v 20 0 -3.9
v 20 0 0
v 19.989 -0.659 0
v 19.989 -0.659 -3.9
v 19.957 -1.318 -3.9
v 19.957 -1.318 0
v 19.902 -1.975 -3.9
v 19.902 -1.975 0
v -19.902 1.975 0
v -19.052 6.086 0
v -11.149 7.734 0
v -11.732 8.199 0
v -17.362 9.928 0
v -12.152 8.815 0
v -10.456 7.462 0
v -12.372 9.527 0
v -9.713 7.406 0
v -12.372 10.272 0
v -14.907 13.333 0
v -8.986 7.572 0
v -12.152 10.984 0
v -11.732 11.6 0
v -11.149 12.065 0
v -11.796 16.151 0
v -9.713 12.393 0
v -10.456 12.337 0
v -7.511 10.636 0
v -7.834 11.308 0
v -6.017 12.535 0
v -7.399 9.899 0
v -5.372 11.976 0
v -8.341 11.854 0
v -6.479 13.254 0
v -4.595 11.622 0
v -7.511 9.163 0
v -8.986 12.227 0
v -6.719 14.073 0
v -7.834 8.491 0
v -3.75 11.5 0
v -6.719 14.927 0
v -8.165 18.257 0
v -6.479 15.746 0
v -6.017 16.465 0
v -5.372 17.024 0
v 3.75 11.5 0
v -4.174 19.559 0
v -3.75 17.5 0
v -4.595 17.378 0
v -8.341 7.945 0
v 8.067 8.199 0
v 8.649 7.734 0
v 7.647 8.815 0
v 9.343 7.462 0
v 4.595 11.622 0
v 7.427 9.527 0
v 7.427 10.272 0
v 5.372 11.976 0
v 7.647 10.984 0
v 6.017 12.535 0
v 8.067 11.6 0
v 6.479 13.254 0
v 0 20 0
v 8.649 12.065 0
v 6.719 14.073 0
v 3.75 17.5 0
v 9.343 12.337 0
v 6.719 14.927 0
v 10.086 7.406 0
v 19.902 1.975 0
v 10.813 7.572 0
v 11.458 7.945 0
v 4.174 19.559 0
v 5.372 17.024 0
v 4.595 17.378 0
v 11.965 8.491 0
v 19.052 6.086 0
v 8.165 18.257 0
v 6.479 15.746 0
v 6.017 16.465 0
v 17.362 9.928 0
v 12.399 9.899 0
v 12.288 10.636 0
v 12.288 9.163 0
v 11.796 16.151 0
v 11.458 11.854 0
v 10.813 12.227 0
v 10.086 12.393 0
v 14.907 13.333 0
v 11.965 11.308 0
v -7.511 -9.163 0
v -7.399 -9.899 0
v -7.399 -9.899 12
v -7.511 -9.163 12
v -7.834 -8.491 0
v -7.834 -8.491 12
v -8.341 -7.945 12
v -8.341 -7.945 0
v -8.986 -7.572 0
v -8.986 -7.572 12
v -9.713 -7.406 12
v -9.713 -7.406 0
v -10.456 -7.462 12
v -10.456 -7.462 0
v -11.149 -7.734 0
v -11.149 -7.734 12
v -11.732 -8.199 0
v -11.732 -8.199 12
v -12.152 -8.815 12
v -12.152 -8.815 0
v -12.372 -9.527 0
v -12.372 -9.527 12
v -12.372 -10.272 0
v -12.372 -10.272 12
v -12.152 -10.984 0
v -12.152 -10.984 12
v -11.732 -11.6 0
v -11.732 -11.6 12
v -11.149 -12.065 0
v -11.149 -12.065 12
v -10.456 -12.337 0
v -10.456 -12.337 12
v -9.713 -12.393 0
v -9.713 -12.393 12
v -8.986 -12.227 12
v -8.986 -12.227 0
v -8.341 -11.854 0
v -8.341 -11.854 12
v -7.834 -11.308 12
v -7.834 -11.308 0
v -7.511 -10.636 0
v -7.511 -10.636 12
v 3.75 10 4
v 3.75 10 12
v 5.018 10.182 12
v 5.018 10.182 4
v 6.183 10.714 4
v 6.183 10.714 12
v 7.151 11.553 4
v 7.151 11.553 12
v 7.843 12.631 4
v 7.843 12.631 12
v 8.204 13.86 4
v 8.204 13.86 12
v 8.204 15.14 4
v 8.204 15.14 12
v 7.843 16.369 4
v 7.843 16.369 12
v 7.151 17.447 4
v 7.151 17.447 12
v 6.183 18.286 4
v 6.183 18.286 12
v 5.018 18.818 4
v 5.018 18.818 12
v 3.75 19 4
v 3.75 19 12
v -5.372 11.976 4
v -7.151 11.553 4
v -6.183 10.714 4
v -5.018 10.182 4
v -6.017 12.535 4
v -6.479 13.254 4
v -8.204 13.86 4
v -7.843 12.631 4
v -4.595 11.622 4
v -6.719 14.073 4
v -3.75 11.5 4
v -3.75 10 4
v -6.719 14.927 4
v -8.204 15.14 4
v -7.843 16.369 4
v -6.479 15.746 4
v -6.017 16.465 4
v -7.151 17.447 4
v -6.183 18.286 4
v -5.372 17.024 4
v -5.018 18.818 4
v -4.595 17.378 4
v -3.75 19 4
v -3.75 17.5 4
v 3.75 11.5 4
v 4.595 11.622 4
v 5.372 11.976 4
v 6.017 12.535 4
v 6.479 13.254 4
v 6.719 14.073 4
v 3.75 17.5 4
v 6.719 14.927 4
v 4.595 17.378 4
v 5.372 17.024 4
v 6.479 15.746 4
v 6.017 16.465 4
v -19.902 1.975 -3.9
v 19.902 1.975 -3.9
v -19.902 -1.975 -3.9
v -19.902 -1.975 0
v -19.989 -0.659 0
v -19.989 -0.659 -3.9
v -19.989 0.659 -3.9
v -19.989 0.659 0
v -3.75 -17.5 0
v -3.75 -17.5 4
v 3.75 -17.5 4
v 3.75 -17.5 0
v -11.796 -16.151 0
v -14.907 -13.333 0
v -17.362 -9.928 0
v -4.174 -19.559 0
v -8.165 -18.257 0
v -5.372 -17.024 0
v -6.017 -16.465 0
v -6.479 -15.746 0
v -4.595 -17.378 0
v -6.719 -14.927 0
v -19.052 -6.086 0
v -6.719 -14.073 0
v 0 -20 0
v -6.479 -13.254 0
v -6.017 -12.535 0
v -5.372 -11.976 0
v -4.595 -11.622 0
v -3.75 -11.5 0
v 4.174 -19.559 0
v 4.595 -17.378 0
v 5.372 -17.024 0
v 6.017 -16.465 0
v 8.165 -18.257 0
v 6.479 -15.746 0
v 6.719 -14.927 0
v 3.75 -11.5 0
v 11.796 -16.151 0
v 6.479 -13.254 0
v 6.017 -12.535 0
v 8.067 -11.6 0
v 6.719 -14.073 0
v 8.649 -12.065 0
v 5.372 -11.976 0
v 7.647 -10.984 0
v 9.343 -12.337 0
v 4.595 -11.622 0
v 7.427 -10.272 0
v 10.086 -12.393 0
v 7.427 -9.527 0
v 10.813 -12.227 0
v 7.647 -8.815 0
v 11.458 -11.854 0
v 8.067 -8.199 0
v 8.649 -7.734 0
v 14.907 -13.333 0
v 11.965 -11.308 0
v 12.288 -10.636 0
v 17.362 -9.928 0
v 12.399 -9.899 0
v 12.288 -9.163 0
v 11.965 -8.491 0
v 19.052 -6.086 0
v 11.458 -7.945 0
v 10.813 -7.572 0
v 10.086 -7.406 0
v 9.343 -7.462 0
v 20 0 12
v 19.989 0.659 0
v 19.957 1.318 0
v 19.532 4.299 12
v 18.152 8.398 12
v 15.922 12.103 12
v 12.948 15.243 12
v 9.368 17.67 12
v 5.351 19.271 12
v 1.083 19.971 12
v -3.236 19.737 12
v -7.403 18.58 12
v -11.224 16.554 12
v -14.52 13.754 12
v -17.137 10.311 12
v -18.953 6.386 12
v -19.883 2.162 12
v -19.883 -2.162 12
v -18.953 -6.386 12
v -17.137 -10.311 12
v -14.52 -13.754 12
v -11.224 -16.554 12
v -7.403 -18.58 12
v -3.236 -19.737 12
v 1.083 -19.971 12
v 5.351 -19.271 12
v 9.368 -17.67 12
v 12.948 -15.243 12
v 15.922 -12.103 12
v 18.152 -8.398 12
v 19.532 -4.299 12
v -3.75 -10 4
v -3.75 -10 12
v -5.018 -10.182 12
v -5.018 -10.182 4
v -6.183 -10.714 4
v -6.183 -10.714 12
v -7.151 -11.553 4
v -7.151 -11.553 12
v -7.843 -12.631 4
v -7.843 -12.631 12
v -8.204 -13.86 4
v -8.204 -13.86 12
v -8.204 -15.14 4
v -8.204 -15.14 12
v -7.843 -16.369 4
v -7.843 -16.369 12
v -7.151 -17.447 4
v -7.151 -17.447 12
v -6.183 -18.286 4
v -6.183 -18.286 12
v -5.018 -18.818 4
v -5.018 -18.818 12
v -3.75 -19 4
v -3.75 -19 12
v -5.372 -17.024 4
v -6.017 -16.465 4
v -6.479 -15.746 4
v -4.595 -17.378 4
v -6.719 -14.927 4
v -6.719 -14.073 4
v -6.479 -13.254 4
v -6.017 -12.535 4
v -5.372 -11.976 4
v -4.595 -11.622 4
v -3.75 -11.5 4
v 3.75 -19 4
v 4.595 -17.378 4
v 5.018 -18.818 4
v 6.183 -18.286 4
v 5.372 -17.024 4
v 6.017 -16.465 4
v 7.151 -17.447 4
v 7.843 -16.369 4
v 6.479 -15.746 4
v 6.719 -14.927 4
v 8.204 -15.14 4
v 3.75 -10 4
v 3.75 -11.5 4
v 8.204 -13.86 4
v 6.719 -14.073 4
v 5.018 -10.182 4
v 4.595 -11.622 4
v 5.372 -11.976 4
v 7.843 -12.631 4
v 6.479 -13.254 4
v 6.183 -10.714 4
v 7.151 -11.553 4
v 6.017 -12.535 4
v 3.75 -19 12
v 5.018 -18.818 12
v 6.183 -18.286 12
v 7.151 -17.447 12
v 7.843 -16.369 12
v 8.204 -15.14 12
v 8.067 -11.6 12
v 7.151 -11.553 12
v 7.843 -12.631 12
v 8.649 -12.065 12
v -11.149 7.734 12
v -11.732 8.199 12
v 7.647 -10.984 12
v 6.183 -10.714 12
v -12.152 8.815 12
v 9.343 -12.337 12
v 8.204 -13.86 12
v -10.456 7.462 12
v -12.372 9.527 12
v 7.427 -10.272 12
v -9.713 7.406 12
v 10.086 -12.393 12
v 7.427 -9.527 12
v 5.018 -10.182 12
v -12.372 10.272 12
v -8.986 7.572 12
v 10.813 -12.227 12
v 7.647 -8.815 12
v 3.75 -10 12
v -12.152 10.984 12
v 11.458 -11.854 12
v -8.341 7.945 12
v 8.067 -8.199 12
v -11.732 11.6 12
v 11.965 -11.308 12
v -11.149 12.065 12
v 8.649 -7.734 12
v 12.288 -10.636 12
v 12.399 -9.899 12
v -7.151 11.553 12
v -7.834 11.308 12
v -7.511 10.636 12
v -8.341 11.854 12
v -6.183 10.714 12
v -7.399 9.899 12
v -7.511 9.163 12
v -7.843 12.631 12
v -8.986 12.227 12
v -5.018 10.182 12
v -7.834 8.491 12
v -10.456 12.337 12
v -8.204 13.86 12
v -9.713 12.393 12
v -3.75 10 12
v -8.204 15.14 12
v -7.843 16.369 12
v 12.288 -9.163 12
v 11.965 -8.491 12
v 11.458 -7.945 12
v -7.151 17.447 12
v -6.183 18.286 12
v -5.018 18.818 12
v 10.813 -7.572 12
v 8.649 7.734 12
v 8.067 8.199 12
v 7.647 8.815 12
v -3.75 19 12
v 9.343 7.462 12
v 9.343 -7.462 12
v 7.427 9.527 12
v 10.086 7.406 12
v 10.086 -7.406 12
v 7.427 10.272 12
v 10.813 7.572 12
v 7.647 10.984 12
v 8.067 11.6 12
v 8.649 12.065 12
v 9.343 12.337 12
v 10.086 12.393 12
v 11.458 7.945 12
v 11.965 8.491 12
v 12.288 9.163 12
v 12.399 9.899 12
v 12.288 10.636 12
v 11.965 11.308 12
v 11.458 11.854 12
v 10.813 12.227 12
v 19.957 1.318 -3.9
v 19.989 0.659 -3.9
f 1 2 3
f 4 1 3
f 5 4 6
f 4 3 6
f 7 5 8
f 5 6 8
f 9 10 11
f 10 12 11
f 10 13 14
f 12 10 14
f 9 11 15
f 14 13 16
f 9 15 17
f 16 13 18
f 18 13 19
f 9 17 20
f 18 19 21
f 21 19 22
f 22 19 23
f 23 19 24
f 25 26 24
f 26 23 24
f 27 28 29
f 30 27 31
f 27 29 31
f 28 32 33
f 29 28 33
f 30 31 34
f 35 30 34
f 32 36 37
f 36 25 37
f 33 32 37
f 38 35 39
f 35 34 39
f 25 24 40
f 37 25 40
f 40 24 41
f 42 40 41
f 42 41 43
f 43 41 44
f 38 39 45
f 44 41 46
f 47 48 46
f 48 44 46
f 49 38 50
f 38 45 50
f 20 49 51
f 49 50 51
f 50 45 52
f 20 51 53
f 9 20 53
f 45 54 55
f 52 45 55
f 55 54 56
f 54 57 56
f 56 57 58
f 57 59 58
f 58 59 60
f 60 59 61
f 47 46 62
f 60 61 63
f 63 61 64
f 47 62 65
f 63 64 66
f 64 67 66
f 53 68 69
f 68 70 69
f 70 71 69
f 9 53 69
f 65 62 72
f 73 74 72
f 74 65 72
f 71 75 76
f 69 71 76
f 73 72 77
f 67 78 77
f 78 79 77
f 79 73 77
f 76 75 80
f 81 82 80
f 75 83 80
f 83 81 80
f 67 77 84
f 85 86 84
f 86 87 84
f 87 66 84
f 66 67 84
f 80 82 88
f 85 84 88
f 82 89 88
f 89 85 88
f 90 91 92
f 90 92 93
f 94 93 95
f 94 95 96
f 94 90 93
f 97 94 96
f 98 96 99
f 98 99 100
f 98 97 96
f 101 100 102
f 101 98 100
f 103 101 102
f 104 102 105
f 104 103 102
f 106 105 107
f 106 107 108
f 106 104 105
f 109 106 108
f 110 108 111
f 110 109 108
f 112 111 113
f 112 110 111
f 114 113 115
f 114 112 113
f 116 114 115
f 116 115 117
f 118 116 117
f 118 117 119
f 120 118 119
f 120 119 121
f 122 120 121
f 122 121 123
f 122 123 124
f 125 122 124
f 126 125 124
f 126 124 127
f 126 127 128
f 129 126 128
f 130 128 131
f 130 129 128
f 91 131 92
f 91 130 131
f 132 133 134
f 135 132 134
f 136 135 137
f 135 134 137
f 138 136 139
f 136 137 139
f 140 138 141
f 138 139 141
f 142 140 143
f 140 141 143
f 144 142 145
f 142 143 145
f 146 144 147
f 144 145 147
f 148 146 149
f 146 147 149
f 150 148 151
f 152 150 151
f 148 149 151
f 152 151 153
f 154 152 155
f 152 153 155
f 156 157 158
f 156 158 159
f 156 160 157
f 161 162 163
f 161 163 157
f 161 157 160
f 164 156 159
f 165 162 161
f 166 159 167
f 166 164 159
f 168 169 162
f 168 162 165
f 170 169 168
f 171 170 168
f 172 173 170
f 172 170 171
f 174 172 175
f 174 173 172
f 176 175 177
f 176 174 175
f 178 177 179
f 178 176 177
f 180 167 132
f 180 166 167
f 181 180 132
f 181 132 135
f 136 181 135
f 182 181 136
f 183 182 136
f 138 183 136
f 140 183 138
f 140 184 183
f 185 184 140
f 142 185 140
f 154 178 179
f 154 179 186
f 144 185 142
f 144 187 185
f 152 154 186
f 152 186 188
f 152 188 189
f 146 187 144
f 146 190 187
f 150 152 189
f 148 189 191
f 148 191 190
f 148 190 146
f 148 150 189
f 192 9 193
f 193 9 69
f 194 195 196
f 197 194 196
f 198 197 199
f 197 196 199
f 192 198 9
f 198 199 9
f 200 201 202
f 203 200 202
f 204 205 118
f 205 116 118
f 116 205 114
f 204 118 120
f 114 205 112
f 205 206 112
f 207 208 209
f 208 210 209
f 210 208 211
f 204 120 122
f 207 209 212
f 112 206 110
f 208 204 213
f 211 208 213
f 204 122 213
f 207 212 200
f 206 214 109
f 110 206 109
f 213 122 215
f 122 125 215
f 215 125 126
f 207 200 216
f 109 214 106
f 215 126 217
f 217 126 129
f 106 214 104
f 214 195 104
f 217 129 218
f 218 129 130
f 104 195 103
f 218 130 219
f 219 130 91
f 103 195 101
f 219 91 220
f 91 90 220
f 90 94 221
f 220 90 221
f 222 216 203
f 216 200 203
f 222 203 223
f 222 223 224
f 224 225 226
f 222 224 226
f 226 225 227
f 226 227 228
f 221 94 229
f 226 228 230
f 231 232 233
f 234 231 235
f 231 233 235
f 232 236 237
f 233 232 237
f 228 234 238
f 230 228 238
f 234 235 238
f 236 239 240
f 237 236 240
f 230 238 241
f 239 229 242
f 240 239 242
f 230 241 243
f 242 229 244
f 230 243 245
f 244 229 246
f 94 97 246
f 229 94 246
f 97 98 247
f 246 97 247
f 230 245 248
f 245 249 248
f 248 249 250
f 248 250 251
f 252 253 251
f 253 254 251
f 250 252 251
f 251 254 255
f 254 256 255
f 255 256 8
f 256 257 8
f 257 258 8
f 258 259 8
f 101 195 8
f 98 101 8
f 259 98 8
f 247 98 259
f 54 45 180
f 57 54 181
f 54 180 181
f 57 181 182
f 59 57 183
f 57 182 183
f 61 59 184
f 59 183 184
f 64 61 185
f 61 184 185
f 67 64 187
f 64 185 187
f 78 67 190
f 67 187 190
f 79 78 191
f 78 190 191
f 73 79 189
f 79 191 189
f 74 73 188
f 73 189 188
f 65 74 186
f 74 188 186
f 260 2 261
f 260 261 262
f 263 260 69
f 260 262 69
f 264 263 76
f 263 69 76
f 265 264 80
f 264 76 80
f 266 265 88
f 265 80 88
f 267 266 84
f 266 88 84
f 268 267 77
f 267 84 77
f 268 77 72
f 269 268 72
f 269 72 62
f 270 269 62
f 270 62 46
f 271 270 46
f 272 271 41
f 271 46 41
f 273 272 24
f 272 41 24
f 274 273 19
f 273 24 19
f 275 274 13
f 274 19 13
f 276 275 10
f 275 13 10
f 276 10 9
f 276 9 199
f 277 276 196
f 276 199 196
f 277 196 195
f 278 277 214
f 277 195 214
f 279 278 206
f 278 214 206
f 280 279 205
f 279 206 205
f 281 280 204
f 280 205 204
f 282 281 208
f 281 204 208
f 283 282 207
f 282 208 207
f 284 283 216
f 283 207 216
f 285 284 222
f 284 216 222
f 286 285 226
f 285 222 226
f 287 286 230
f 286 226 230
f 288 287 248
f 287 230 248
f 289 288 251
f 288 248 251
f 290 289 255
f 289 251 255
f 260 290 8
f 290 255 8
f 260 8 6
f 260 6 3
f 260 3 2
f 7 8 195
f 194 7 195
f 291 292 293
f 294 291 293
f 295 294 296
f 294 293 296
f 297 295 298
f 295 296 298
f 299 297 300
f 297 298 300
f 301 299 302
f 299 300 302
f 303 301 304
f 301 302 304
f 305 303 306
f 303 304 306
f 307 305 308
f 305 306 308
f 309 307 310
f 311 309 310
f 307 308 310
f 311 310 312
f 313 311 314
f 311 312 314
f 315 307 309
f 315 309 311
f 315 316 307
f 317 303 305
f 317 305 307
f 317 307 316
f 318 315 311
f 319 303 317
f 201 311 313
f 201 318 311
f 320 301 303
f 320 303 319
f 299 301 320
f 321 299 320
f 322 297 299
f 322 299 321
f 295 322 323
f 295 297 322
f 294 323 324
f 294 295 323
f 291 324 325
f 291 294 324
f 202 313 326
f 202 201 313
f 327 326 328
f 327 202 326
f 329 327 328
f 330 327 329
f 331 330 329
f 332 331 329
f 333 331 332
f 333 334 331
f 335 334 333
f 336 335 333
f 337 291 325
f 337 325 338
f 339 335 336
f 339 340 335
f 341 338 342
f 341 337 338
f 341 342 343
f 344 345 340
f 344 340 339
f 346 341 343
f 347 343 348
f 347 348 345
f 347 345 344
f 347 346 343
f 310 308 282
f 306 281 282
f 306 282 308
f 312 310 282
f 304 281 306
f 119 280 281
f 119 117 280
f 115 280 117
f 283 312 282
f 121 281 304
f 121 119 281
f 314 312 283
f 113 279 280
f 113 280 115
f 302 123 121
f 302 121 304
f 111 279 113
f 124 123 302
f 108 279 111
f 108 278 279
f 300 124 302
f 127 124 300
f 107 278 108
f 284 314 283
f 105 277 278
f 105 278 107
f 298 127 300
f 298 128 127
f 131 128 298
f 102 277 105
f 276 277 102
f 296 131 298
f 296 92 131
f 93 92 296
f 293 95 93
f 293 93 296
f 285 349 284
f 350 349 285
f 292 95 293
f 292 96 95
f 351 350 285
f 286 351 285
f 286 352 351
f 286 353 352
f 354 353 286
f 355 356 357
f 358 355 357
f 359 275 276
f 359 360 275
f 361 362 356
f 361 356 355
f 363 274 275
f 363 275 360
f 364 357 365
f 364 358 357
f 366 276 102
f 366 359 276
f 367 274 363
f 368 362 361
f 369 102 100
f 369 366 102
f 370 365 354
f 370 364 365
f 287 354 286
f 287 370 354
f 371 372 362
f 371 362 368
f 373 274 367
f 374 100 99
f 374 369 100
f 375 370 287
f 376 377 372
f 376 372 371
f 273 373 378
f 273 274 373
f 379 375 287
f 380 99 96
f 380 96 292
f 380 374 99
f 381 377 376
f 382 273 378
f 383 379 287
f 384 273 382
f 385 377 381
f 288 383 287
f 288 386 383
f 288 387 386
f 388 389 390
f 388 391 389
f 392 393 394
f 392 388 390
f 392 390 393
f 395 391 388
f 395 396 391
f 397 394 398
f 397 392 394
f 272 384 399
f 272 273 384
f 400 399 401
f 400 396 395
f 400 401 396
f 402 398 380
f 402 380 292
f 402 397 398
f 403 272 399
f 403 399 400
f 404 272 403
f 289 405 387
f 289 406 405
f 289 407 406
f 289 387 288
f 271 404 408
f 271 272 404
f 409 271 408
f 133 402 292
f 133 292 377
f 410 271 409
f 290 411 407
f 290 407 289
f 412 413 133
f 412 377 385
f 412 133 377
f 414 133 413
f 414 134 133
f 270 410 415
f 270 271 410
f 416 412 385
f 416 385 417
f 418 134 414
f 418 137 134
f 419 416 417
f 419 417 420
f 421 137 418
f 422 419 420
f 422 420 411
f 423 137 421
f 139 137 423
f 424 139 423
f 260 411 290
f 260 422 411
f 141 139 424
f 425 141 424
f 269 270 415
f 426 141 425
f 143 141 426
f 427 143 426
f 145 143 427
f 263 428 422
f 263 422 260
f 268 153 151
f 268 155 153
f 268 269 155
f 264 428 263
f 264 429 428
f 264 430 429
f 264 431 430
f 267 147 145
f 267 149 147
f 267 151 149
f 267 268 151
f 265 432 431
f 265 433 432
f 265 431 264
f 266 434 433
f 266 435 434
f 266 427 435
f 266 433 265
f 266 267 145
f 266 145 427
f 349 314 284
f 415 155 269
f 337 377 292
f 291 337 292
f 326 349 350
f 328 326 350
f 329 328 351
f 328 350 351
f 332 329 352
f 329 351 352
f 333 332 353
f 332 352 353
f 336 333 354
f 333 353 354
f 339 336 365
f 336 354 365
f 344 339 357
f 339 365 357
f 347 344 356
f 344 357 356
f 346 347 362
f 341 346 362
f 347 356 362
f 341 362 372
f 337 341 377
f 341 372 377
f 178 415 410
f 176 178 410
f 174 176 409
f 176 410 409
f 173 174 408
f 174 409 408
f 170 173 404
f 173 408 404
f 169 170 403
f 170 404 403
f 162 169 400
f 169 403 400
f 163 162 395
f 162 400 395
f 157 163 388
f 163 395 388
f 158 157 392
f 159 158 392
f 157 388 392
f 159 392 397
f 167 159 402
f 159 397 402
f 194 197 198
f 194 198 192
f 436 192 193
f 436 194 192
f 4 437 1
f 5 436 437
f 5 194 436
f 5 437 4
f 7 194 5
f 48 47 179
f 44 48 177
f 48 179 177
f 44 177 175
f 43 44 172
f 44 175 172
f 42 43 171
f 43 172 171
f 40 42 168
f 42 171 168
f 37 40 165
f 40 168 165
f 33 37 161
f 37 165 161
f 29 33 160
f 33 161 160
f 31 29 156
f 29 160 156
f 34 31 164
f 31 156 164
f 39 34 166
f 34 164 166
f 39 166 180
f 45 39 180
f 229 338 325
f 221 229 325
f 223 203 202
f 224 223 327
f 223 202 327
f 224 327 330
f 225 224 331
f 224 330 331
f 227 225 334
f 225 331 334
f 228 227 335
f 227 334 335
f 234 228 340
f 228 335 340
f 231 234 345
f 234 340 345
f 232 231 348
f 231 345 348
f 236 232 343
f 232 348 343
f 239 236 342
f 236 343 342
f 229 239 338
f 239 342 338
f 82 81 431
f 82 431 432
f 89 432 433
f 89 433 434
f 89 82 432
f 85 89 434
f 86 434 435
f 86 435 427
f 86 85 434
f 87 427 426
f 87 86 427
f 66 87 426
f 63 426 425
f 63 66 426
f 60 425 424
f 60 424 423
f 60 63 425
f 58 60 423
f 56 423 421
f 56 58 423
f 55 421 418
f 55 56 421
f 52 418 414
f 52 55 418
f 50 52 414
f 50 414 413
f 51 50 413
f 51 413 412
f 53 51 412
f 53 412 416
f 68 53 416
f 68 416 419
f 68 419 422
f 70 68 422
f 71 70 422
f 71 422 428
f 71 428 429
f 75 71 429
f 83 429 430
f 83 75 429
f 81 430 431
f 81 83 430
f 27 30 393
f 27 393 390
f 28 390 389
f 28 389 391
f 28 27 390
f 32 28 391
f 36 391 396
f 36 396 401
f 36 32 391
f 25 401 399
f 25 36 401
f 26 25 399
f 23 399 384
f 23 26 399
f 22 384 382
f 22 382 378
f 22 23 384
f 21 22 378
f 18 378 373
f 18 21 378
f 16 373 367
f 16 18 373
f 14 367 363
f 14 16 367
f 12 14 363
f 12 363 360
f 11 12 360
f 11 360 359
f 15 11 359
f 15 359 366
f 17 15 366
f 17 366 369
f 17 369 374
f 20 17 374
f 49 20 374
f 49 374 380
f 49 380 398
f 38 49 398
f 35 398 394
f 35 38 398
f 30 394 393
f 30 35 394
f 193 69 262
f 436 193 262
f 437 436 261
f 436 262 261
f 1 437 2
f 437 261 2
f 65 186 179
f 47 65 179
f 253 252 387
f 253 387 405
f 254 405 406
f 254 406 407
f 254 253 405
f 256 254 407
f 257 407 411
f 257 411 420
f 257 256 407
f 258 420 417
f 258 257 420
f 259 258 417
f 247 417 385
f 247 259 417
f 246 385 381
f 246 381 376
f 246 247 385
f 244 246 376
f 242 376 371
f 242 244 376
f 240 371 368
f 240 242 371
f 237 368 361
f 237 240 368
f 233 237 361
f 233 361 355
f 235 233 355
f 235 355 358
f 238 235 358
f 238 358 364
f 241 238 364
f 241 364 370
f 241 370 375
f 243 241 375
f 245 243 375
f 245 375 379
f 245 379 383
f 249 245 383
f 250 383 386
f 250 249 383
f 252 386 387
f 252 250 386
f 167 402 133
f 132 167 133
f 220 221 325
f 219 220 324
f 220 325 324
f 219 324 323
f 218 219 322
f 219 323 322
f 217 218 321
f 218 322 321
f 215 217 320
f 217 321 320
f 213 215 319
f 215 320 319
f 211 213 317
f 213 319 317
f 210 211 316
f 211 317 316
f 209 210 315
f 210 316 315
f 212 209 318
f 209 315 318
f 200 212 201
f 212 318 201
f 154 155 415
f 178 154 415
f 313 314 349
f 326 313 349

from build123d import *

# Parameters (mm, degrees)
F0_R     = 20
F0_R_2   = 2.5
F1_DEPTH = 12
F3_DEPTH = 3.9
F5_DEPTH = 15.901
F7_DEPTH = 8


# Not quite as in the source:
# - after a boolean that leaves OpenCascade's solid faulty, fix() repairs it


with BuildPart() as f1:
    # F0 (on Top) → F1 (new body)
    with BuildSketch(Plane.XY):
        Circle(F0_R)
        with Locations((-9.8994949366, -9.8994949366)):
            Circle(F0_R_2, mode=Mode.SUBTRACT)
        with Locations((9.8994949366, -9.8994949366)):
            Circle(F0_R_2, mode=Mode.SUBTRACT)
        with Locations((-9.8994949366, 9.8994949366)):
            Circle(F0_R_2, mode=Mode.SUBTRACT)
        with Locations((9.8994949366, 9.8994949366)):
            Circle(F0_R_2, mode=Mode.SUBTRACT)
    extrude(amount=F1_DEPTH)

    # F2 (on face) → F3 (join)
    with BuildSketch(Plane(origin=(0, 0, 0), x_dir=(1, 0, 0), z_dir=(0, 0, -1))):
        with BuildLine():
            Line((19.9022454763, 1.975), (-19.9022454763, 1.975))
            ThreePointArc((-19.9022454763, 1.975), (-20, 0), (-19.9022454763, -1.975))
            Line((-19.9022454763, -1.975), (19.9022454763, -1.975))
            ThreePointArc((19.9022454763, -1.975), (19.9755464196, -0.9887088736), (20, 0))
            ThreePointArc((20, 0), (19.9755464196, 0.9887088736), (19.9022454763, 1.975))
        make_face()
    extrude(amount=F3_DEPTH)

    add(f1.part.fix(), mode=Mode.REPLACE)

    # F4 (on face) → F5 (cut, through all)
    with BuildSketch(Plane.XY.offset(12)):
        with BuildLine():
            Line((3.75, 17.5), (-3.75, 17.5))
            ThreePointArc((-3.75, 17.5), (-6.75, 14.5), (-3.75, 11.5))
            Line((-3.75, 11.5), (3.75, 11.5))
            ThreePointArc((3.75, 11.5), (6.75, 14.5), (3.75, 17.5))
        make_face()
        with BuildLine():
            ThreePointArc((3.75, -17.5), (6.75, -14.5), (3.75, -11.5))
            Line((3.75, -11.5), (-3.75, -11.5))
            ThreePointArc((-3.75, -11.5), (-6.75, -14.5), (-3.75, -17.5))
            Line((-3.75, -17.5), (3.75, -17.5))
        make_face()
    extrude(amount=-F5_DEPTH, mode=Mode.SUBTRACT)

    # F6 (on face) → F7 (cut)
    with BuildSketch(Plane.XY.offset(12)):
        with BuildLine():
            Line((3.75, 19), (-3.75, 19))
            ThreePointArc((-3.75, 19), (-8.25, 14.5), (-3.75, 10))
            Line((-3.75, 10), (3.75, 10))
            ThreePointArc((3.75, 10), (8.25, 14.5), (3.75, 19))
        make_face()
        with BuildLine():
            ThreePointArc((-3.75, 11.5), (-6.75, 14.5), (-3.75, 17.5))
            Line((-3.75, 17.5), (3.75, 17.5))
            ThreePointArc((3.75, 17.5), (6.75, 14.5), (3.75, 11.5))
            Line((3.75, 11.5), (-3.75, 11.5))
        make_face(mode=Mode.SUBTRACT)
        with BuildLine():
            ThreePointArc((3.75, -19), (8.25, -14.5), (3.75, -10))
            Line((3.75, -10), (-3.75, -10))
            ThreePointArc((-3.75, -10), (-8.25, -14.5), (-3.75, -19))
            Line((-3.75, -19), (3.75, -19))
        make_face()
        with BuildLine():
            ThreePointArc((3.75, -11.5), (6.75, -14.5), (3.75, -17.5))
            Line((3.75, -17.5), (-3.75, -17.5))
            ThreePointArc((-3.75, -17.5), (-6.75, -14.5), (-3.75, -11.5))
            Line((-3.75, -11.5), (3.75, -11.5))
        make_face(mode=Mode.SUBTRACT)
    extrude(amount=-F7_DEPTH, mode=Mode.SUBTRACT)


solid = f1.part
